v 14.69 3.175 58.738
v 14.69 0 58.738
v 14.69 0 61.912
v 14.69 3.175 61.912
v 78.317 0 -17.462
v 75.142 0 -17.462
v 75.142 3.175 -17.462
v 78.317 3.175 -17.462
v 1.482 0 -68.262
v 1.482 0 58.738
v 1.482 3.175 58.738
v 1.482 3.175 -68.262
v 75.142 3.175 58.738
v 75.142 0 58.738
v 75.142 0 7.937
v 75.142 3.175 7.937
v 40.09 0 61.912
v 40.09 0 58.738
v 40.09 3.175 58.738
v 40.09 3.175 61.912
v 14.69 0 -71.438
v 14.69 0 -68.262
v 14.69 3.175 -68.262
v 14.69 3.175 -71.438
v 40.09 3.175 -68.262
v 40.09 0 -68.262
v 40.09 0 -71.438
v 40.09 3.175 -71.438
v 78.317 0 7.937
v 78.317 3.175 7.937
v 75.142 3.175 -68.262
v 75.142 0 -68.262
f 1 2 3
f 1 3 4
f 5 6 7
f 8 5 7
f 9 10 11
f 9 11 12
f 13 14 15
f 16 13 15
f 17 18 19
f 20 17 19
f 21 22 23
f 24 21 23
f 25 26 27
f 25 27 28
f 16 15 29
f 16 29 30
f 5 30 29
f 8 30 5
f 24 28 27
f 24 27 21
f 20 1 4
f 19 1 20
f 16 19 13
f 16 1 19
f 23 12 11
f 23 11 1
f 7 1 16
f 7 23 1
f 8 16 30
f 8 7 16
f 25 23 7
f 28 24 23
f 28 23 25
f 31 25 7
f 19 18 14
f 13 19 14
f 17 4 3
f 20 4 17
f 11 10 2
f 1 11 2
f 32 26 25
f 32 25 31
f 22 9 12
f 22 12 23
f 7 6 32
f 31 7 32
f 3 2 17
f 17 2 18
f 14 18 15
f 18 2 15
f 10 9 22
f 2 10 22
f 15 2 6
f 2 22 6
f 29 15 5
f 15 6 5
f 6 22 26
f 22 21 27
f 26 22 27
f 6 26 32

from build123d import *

# Parameters (mm, degrees)
SKETCH1_W           = 73.66
SKETCH1_H           = 127
BOSS_EXTRUDE1_DEPTH = 3.175
SKETCH2_W           = 25.4
SKETCH2_H           = 3.175
BOSS_EXTRUDE2_DEPTH = 3.175
SKETCH3_W           = 25.4
SKETCH3_H           = 3.175
BOSS_EXTRUDE3_DEPTH = 3.175
SKETCH5_W           = 25.4
SKETCH5_H           = 3.175
BOSS_EXTRUDE4_DEPTH = 3.175


with BuildPart() as part:
    # Sketch1 → Boss-Extrude1 (new body)
    with BuildSketch(Plane(origin=(0, 0, 0), x_dir=(1, 0, 0), z_dir=(0, 1, 0))):
        with Locations((38.311666667, 4.7625)):
            Rectangle(SKETCH1_W, SKETCH1_H)
    extrude(amount=BOSS_EXTRUDE1_DEPTH)

    # Sketch2 → Boss-Extrude2 (add)
    with BuildSketch(Plane(origin=(75.141666667, 0, 0), x_dir=(0, 0, -1), z_dir=(1, 0, 0))):
        with Locations((4.7625, 1.5875)):
            Rectangle(SKETCH2_W, SKETCH2_H)
    extrude(amount=BOSS_EXTRUDE2_DEPTH)

    # Sketch3 → Boss-Extrude3 (add)
    with BuildSketch(Plane.XY.offset(58.7375)):
        with Locations((27.389666667, 1.5875)):
            Rectangle(SKETCH3_W, SKETCH3_H)
    extrude(amount=BOSS_EXTRUDE3_DEPTH)

    # Sketch5 → Boss-Extrude4 (add)
    with BuildSketch(Plane(origin=(0, 0, -68.2625), x_dir=(-1, 0, 0), z_dir=(0, 0, -1))):
        with Locations((-27.389666667, 1.5875)):
            Rectangle(SKETCH5_W, SKETCH5_H)
    extrude(amount=BOSS_EXTRUDE4_DEPTH)


solid = part.part
